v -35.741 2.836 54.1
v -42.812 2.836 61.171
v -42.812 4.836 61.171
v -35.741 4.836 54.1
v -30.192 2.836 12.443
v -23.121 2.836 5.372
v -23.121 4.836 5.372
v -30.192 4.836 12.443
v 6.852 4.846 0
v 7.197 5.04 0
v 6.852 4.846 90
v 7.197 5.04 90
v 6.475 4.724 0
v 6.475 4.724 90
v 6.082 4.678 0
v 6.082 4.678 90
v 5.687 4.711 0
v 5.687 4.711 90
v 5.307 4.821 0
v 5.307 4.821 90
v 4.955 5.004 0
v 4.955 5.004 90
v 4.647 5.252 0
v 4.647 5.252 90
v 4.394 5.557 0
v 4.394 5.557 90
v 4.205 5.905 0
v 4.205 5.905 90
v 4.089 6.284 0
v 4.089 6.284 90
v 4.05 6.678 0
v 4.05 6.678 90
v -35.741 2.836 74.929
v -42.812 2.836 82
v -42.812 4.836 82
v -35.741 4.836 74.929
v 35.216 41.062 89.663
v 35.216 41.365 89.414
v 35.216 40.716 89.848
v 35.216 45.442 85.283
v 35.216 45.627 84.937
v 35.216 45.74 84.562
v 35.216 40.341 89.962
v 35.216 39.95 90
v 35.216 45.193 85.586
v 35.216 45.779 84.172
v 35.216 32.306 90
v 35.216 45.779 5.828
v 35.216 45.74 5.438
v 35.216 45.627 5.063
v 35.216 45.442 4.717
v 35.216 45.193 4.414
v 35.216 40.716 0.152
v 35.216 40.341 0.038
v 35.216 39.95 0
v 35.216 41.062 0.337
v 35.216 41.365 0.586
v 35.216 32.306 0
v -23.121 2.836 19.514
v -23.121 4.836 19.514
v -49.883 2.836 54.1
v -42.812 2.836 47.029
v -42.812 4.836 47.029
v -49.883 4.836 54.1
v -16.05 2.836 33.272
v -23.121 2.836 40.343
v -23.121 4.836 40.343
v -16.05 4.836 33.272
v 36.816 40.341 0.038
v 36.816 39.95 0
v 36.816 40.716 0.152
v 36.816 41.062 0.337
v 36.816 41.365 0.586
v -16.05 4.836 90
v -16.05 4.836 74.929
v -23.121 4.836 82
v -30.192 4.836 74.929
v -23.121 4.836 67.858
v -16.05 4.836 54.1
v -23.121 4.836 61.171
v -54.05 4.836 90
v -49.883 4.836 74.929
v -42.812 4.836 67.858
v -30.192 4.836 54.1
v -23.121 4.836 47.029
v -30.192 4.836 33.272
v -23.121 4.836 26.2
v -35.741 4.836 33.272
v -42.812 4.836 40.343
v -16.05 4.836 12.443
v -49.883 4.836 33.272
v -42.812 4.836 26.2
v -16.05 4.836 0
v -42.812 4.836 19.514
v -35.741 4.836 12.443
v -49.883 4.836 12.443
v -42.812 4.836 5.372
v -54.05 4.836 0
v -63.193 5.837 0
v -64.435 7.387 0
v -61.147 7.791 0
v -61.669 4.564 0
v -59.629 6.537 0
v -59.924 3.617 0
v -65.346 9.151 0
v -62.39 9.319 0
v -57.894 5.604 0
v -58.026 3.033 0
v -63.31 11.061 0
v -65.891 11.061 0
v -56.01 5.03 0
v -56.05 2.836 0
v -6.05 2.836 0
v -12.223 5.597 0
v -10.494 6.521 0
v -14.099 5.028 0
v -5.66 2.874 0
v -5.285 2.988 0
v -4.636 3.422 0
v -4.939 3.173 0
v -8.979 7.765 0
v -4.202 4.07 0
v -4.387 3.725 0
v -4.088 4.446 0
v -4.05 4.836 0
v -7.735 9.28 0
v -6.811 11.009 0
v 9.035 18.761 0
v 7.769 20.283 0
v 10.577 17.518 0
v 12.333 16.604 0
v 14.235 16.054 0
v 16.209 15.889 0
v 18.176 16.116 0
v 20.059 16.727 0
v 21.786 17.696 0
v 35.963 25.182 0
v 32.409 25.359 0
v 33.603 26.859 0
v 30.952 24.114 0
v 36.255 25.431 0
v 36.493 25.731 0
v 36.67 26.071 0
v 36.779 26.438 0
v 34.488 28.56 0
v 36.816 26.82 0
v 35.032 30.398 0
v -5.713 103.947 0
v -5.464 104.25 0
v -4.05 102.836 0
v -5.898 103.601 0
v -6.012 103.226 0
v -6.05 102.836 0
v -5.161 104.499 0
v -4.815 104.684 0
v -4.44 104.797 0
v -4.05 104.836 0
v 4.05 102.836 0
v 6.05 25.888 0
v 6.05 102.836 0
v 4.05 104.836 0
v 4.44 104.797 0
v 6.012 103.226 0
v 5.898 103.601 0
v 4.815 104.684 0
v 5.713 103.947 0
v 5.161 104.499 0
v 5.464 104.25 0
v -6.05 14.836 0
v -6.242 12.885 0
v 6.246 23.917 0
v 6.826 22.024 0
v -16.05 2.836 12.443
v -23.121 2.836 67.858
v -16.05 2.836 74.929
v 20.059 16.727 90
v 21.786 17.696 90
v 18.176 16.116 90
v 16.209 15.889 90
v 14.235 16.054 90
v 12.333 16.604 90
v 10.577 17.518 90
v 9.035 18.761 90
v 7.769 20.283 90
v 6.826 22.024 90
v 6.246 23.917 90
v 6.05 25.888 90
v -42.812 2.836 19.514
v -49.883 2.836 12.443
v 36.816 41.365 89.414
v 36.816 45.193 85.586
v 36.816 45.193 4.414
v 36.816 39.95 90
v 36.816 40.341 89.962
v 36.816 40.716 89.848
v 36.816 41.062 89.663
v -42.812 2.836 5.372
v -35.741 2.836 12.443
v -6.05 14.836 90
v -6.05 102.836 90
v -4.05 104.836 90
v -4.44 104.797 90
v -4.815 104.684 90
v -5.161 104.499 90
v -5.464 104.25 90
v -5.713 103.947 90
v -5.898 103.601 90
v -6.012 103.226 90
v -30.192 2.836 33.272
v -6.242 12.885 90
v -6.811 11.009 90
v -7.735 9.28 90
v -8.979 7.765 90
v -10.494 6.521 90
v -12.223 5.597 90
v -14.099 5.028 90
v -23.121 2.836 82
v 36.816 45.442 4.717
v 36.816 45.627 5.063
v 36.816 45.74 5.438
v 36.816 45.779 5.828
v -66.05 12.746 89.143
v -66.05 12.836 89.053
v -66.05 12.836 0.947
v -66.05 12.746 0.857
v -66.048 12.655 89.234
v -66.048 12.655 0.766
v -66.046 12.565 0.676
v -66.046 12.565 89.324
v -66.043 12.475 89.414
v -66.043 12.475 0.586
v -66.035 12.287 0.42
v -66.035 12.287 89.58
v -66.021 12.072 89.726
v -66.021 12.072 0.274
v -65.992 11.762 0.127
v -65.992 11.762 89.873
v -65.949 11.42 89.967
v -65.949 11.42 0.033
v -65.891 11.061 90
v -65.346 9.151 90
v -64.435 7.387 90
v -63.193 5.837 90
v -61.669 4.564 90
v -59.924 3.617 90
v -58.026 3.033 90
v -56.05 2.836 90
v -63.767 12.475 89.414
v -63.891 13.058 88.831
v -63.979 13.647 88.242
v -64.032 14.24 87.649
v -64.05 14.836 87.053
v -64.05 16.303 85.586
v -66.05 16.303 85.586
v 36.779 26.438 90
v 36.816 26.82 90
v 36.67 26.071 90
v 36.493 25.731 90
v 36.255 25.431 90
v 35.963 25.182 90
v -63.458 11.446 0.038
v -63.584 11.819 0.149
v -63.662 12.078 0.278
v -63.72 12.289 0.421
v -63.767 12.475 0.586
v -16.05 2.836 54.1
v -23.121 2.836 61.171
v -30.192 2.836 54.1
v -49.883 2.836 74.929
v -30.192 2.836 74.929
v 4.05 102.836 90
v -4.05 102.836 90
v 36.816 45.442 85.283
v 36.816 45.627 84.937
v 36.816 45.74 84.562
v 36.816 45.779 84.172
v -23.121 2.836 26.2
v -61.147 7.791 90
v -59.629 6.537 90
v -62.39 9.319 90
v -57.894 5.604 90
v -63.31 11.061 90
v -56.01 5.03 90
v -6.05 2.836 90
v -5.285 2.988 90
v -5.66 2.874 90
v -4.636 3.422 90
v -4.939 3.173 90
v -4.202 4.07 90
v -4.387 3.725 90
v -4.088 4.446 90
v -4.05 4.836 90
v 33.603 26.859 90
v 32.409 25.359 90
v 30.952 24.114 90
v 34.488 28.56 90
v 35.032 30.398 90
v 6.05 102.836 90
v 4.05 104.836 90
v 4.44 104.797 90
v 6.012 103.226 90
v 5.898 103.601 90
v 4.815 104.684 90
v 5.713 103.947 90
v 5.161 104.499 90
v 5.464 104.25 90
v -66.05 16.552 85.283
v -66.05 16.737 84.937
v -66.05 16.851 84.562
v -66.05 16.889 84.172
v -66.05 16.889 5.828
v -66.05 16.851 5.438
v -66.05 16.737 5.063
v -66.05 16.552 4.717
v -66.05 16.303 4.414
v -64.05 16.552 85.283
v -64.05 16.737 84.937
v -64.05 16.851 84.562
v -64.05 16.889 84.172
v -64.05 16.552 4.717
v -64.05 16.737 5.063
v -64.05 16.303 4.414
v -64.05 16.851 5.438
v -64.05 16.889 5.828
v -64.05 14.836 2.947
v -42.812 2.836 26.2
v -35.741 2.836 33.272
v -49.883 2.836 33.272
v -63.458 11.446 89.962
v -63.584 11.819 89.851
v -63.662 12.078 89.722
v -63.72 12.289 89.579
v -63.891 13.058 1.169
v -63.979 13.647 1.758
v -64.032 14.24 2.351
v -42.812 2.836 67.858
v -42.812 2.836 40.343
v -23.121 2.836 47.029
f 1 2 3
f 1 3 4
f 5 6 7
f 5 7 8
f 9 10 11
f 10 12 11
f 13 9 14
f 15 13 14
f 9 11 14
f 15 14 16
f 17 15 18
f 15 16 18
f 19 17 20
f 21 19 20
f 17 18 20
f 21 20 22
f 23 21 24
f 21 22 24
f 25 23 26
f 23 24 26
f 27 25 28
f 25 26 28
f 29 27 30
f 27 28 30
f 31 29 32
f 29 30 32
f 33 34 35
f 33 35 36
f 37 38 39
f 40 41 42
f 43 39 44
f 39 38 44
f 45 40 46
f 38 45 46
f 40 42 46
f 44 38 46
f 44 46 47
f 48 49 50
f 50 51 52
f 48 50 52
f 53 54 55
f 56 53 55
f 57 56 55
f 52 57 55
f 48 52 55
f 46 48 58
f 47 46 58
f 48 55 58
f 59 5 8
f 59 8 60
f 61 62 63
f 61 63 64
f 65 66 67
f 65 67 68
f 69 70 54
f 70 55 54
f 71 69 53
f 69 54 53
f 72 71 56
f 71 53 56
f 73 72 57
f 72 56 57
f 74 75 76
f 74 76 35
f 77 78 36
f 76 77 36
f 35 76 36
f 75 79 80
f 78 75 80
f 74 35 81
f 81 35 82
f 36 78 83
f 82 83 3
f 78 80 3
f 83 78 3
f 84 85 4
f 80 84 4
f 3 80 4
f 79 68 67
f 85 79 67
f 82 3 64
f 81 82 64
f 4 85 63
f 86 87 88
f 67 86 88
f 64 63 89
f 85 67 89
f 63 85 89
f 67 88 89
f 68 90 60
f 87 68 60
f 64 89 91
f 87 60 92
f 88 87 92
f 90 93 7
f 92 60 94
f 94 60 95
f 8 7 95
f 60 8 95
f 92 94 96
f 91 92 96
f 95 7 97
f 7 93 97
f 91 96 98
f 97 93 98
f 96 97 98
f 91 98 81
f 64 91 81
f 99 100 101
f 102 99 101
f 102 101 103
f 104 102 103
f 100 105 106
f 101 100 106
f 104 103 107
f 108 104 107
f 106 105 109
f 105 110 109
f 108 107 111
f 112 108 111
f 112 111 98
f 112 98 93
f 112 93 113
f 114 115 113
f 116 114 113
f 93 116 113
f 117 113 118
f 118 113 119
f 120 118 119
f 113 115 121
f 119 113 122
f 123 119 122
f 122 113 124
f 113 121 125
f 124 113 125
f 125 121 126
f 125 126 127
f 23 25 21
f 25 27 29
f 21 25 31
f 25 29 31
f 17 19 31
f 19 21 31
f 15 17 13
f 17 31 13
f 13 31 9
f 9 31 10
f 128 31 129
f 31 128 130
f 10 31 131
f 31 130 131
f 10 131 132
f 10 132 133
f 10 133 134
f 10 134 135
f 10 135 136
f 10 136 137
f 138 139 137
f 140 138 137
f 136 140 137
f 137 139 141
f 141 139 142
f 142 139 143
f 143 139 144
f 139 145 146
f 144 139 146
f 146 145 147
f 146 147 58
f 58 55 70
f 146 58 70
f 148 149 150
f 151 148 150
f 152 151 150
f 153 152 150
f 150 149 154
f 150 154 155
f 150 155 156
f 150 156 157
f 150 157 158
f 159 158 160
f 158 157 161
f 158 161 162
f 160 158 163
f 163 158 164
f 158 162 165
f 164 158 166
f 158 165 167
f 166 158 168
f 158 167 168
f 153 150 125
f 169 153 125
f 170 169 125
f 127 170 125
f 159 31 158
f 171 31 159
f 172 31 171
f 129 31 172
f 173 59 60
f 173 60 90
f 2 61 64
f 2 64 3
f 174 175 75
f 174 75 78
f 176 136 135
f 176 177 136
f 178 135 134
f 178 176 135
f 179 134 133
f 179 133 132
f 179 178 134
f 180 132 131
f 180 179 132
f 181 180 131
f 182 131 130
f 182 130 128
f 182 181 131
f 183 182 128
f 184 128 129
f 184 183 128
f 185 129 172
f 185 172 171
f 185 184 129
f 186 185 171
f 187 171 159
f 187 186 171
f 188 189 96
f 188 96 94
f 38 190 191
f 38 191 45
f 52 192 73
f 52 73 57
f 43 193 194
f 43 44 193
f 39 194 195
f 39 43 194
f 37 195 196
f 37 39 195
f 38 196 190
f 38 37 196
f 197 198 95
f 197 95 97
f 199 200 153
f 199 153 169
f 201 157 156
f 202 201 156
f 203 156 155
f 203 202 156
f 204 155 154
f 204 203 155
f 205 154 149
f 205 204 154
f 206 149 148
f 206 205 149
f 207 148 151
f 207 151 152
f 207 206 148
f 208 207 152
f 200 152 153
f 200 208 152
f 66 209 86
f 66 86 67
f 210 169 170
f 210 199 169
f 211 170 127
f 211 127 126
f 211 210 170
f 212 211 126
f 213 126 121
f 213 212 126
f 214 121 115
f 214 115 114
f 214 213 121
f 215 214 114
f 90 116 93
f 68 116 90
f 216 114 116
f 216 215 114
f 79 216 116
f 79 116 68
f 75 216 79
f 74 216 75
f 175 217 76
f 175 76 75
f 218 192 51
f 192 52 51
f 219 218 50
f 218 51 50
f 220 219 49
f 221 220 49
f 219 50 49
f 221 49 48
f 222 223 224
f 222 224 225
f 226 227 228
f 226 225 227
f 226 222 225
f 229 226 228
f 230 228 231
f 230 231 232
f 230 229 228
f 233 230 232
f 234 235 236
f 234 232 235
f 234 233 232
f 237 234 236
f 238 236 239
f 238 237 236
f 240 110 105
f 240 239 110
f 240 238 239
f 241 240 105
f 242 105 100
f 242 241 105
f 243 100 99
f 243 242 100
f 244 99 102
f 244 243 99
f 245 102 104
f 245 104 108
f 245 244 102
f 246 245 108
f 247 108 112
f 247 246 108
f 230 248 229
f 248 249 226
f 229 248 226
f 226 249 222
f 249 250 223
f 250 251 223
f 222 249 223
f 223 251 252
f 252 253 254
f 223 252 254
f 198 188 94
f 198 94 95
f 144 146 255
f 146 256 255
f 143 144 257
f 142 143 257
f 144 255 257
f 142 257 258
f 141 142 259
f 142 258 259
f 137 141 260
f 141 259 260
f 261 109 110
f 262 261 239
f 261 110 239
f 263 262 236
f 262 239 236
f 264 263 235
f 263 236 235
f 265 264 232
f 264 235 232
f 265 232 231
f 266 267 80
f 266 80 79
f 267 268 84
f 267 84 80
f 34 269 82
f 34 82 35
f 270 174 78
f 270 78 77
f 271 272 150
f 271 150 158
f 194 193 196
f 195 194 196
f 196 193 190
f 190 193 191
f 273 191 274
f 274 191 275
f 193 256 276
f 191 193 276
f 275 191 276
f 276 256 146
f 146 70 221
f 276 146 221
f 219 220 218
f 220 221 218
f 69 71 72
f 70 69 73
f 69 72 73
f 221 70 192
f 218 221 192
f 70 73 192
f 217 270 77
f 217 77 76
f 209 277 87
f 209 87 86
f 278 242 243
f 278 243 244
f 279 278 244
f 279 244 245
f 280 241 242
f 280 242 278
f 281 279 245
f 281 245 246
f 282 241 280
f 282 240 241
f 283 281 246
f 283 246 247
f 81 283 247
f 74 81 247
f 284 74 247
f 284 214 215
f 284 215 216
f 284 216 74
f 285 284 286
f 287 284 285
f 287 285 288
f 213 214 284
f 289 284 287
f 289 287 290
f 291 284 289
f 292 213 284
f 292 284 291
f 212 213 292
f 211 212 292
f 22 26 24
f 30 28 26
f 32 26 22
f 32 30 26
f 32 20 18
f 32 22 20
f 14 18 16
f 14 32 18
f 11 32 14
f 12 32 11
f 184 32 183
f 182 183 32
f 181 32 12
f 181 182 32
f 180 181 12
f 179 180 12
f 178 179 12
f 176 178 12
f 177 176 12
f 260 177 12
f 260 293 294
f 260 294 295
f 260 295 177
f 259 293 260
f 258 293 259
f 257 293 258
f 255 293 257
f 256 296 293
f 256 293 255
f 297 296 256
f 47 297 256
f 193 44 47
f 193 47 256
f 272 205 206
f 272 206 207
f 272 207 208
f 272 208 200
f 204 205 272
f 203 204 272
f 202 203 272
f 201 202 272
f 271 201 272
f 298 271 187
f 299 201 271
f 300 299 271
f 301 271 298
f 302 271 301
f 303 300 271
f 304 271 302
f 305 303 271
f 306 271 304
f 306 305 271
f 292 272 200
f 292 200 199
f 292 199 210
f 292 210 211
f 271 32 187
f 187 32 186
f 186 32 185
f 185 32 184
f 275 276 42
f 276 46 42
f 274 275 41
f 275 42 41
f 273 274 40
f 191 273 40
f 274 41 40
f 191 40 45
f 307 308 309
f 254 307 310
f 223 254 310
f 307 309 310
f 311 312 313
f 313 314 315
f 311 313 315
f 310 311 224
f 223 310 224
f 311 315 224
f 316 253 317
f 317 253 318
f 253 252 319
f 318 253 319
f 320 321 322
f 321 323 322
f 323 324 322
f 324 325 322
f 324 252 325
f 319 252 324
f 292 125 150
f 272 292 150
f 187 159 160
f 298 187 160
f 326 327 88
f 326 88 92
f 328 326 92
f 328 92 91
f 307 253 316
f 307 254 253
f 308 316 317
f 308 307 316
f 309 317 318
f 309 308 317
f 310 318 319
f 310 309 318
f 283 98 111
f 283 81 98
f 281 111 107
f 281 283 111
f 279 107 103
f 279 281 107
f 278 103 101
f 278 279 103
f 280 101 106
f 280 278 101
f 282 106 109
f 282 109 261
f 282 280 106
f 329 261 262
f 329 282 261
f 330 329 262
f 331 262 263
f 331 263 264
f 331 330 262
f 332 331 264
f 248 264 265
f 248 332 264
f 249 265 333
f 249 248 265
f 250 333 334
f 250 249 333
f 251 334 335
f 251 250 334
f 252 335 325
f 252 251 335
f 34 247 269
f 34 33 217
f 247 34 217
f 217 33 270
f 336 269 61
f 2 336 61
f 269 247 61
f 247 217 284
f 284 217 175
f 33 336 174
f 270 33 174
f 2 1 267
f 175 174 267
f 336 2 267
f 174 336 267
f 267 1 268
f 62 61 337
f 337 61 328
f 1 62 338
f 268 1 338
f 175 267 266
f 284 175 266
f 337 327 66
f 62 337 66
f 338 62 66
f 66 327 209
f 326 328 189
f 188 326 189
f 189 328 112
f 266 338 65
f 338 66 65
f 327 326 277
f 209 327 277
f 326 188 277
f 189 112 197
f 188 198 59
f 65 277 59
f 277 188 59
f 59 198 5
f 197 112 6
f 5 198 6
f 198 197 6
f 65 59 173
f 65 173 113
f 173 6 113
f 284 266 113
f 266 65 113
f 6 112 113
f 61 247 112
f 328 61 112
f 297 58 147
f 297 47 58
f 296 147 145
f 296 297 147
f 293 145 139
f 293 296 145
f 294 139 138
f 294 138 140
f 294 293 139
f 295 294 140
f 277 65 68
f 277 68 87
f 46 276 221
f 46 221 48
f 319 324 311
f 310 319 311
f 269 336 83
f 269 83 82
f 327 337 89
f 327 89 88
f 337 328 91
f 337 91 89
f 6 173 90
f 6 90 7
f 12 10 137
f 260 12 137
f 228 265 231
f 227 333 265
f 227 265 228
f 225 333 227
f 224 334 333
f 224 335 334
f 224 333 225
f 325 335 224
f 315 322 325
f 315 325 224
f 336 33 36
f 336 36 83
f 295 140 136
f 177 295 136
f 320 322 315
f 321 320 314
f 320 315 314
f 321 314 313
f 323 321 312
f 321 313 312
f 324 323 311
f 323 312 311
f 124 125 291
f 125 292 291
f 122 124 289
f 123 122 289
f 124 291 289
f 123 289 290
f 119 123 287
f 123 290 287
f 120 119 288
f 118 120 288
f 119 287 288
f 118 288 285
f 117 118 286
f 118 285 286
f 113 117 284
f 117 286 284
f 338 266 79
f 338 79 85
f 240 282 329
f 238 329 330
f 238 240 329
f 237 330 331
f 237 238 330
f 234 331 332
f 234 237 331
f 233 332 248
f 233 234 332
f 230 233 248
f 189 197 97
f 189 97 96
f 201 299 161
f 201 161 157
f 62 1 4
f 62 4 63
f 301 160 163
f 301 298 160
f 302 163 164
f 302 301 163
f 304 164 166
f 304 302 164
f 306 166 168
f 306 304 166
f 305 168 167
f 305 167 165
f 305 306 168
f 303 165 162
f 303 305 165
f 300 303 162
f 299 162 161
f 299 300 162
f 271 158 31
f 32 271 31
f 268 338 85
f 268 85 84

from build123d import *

# Parameters (mm, degrees)
BOSS_EXTRU_1_DEPTH              = 90
CONG_1_R                        = 10
CHANFREIN1_SIZE                 = 5
CONG_2_R                        = 2
ENL_V_MAT_EXTRU_1_DEPTH         = 2
R_P_TITION_LIN_AIRE1_COUNT      = 4
R_P_TITION_LIN_AIRE1_PITCH      = 20.828705533
R_P_TITION_LIN_AIRE1_COUNT_DIR2 = 2
R_P_TITION_LIN_AIRE1_PITCH_DIR2 = 19.691351592


with BuildPart() as part:
    # Esquisse1 → Boss.-Extru.1 (new body)
    with BuildSketch(Plane.XY):
        Polygon((-4.05, 2.83584053), (-4.05, 102.83584053), (4.05, 102.83584053), (4.05, 2.83584053), (36.816081772, 25.778897984), (36.816081772, 45.778897984), (35.216081772, 45.778897984), (35.216081772, 27.1001151), (6.05, 6.677804784), (6.05, 104.83584053), (-6.05, 104.83584053), (-6.05, 4.83584053), (-64.05, 4.83584053), (-64.05, 16.888959942), (-66.05, 16.888959942), (-66.05, 2.83584053), (-6.05, 2.83584053), align=None)
    extrude(amount=BOSS_EXTRU_1_DEPTH)

    # Congé1
    cong_1_edges = [part.edges().sort_by_distance(p)[0] for p in [
        (-66.05, 2.83584053, 45),
        (-64.05, 4.83584053, 45),
        (-6.05, 4.83584053, 45),
        (6.05, 6.677804784, 45),
        (35.216081772, 27.1001151, 45),
    ]]
    fillet(cong_1_edges, radius=CONG_1_R)

    # Chanfrein1
    chanfrein1_edges = [part.edges().sort_by_distance(p)[0] for p in [
        (36.016081772, 45.778897984, 0),
        (36.016081772, 45.778897984, 90),
        (-65.05, 16.888959942, 0),
        (-65.05, 16.888959942, 90),
    ]]
    chamfer(chanfrein1_edges, length=CHANFREIN1_SIZE)

    # Congé2
    cong_2_edges = [part.edges().sort_by_distance(p)[0] for p in [
        (36.816081772, 25.778897984, 45),
        (4.05, 2.83584053, 45),
        (36.016081772, 40.778897984, 90),
        (36.016081772, 40.778897984, 0),
        (36.016081772, 45.778897984, 5),
        (36.016081772, 45.778897984, 85),
        (-64.805502489, 11.888959942, 90),
        (-65.05, 16.888959942, 85),
        (-64.805502489, 11.888959942, 0),
        (-65.05, 16.888959942, 5),
        (6.05, 104.83584053, 45),
        (-6.05, 104.83584053, 45),
        (-4.05, 2.83584053, 45),
    ]]
    fillet(cong_2_edges, radius=CONG_2_R)

    # Esquisse2 → Enlèv. mat.-Extru.1 (cut)
    with BuildSketch(Plane.XZ.offset(-2.83584053)):
        Polygon((-49.883487215, 12.442815588), (-42.812419404, 19.5138834), (-35.741351592, 12.442815588), (-42.812419404, 5.371747776), align=None)
    enl_v_mat_extru_1 = extrude(amount=-ENL_V_MAT_EXTRU_1_DEPTH, mode=Mode.SUBTRACT)

    # Répétition linéaire1: Enl_v. mat.-Extru.1 4 × 2
    with Locations(*[(j * R_P_TITION_LIN_AIRE1_PITCH_DIR2, 0, i * R_P_TITION_LIN_AIRE1_PITCH) for i in range(R_P_TITION_LIN_AIRE1_COUNT) for j in range(R_P_TITION_LIN_AIRE1_COUNT_DIR2) if (i, j) != (0, 0)]):
        add(enl_v_mat_extru_1, mode=Mode.SUBTRACT)


solid = part.part
